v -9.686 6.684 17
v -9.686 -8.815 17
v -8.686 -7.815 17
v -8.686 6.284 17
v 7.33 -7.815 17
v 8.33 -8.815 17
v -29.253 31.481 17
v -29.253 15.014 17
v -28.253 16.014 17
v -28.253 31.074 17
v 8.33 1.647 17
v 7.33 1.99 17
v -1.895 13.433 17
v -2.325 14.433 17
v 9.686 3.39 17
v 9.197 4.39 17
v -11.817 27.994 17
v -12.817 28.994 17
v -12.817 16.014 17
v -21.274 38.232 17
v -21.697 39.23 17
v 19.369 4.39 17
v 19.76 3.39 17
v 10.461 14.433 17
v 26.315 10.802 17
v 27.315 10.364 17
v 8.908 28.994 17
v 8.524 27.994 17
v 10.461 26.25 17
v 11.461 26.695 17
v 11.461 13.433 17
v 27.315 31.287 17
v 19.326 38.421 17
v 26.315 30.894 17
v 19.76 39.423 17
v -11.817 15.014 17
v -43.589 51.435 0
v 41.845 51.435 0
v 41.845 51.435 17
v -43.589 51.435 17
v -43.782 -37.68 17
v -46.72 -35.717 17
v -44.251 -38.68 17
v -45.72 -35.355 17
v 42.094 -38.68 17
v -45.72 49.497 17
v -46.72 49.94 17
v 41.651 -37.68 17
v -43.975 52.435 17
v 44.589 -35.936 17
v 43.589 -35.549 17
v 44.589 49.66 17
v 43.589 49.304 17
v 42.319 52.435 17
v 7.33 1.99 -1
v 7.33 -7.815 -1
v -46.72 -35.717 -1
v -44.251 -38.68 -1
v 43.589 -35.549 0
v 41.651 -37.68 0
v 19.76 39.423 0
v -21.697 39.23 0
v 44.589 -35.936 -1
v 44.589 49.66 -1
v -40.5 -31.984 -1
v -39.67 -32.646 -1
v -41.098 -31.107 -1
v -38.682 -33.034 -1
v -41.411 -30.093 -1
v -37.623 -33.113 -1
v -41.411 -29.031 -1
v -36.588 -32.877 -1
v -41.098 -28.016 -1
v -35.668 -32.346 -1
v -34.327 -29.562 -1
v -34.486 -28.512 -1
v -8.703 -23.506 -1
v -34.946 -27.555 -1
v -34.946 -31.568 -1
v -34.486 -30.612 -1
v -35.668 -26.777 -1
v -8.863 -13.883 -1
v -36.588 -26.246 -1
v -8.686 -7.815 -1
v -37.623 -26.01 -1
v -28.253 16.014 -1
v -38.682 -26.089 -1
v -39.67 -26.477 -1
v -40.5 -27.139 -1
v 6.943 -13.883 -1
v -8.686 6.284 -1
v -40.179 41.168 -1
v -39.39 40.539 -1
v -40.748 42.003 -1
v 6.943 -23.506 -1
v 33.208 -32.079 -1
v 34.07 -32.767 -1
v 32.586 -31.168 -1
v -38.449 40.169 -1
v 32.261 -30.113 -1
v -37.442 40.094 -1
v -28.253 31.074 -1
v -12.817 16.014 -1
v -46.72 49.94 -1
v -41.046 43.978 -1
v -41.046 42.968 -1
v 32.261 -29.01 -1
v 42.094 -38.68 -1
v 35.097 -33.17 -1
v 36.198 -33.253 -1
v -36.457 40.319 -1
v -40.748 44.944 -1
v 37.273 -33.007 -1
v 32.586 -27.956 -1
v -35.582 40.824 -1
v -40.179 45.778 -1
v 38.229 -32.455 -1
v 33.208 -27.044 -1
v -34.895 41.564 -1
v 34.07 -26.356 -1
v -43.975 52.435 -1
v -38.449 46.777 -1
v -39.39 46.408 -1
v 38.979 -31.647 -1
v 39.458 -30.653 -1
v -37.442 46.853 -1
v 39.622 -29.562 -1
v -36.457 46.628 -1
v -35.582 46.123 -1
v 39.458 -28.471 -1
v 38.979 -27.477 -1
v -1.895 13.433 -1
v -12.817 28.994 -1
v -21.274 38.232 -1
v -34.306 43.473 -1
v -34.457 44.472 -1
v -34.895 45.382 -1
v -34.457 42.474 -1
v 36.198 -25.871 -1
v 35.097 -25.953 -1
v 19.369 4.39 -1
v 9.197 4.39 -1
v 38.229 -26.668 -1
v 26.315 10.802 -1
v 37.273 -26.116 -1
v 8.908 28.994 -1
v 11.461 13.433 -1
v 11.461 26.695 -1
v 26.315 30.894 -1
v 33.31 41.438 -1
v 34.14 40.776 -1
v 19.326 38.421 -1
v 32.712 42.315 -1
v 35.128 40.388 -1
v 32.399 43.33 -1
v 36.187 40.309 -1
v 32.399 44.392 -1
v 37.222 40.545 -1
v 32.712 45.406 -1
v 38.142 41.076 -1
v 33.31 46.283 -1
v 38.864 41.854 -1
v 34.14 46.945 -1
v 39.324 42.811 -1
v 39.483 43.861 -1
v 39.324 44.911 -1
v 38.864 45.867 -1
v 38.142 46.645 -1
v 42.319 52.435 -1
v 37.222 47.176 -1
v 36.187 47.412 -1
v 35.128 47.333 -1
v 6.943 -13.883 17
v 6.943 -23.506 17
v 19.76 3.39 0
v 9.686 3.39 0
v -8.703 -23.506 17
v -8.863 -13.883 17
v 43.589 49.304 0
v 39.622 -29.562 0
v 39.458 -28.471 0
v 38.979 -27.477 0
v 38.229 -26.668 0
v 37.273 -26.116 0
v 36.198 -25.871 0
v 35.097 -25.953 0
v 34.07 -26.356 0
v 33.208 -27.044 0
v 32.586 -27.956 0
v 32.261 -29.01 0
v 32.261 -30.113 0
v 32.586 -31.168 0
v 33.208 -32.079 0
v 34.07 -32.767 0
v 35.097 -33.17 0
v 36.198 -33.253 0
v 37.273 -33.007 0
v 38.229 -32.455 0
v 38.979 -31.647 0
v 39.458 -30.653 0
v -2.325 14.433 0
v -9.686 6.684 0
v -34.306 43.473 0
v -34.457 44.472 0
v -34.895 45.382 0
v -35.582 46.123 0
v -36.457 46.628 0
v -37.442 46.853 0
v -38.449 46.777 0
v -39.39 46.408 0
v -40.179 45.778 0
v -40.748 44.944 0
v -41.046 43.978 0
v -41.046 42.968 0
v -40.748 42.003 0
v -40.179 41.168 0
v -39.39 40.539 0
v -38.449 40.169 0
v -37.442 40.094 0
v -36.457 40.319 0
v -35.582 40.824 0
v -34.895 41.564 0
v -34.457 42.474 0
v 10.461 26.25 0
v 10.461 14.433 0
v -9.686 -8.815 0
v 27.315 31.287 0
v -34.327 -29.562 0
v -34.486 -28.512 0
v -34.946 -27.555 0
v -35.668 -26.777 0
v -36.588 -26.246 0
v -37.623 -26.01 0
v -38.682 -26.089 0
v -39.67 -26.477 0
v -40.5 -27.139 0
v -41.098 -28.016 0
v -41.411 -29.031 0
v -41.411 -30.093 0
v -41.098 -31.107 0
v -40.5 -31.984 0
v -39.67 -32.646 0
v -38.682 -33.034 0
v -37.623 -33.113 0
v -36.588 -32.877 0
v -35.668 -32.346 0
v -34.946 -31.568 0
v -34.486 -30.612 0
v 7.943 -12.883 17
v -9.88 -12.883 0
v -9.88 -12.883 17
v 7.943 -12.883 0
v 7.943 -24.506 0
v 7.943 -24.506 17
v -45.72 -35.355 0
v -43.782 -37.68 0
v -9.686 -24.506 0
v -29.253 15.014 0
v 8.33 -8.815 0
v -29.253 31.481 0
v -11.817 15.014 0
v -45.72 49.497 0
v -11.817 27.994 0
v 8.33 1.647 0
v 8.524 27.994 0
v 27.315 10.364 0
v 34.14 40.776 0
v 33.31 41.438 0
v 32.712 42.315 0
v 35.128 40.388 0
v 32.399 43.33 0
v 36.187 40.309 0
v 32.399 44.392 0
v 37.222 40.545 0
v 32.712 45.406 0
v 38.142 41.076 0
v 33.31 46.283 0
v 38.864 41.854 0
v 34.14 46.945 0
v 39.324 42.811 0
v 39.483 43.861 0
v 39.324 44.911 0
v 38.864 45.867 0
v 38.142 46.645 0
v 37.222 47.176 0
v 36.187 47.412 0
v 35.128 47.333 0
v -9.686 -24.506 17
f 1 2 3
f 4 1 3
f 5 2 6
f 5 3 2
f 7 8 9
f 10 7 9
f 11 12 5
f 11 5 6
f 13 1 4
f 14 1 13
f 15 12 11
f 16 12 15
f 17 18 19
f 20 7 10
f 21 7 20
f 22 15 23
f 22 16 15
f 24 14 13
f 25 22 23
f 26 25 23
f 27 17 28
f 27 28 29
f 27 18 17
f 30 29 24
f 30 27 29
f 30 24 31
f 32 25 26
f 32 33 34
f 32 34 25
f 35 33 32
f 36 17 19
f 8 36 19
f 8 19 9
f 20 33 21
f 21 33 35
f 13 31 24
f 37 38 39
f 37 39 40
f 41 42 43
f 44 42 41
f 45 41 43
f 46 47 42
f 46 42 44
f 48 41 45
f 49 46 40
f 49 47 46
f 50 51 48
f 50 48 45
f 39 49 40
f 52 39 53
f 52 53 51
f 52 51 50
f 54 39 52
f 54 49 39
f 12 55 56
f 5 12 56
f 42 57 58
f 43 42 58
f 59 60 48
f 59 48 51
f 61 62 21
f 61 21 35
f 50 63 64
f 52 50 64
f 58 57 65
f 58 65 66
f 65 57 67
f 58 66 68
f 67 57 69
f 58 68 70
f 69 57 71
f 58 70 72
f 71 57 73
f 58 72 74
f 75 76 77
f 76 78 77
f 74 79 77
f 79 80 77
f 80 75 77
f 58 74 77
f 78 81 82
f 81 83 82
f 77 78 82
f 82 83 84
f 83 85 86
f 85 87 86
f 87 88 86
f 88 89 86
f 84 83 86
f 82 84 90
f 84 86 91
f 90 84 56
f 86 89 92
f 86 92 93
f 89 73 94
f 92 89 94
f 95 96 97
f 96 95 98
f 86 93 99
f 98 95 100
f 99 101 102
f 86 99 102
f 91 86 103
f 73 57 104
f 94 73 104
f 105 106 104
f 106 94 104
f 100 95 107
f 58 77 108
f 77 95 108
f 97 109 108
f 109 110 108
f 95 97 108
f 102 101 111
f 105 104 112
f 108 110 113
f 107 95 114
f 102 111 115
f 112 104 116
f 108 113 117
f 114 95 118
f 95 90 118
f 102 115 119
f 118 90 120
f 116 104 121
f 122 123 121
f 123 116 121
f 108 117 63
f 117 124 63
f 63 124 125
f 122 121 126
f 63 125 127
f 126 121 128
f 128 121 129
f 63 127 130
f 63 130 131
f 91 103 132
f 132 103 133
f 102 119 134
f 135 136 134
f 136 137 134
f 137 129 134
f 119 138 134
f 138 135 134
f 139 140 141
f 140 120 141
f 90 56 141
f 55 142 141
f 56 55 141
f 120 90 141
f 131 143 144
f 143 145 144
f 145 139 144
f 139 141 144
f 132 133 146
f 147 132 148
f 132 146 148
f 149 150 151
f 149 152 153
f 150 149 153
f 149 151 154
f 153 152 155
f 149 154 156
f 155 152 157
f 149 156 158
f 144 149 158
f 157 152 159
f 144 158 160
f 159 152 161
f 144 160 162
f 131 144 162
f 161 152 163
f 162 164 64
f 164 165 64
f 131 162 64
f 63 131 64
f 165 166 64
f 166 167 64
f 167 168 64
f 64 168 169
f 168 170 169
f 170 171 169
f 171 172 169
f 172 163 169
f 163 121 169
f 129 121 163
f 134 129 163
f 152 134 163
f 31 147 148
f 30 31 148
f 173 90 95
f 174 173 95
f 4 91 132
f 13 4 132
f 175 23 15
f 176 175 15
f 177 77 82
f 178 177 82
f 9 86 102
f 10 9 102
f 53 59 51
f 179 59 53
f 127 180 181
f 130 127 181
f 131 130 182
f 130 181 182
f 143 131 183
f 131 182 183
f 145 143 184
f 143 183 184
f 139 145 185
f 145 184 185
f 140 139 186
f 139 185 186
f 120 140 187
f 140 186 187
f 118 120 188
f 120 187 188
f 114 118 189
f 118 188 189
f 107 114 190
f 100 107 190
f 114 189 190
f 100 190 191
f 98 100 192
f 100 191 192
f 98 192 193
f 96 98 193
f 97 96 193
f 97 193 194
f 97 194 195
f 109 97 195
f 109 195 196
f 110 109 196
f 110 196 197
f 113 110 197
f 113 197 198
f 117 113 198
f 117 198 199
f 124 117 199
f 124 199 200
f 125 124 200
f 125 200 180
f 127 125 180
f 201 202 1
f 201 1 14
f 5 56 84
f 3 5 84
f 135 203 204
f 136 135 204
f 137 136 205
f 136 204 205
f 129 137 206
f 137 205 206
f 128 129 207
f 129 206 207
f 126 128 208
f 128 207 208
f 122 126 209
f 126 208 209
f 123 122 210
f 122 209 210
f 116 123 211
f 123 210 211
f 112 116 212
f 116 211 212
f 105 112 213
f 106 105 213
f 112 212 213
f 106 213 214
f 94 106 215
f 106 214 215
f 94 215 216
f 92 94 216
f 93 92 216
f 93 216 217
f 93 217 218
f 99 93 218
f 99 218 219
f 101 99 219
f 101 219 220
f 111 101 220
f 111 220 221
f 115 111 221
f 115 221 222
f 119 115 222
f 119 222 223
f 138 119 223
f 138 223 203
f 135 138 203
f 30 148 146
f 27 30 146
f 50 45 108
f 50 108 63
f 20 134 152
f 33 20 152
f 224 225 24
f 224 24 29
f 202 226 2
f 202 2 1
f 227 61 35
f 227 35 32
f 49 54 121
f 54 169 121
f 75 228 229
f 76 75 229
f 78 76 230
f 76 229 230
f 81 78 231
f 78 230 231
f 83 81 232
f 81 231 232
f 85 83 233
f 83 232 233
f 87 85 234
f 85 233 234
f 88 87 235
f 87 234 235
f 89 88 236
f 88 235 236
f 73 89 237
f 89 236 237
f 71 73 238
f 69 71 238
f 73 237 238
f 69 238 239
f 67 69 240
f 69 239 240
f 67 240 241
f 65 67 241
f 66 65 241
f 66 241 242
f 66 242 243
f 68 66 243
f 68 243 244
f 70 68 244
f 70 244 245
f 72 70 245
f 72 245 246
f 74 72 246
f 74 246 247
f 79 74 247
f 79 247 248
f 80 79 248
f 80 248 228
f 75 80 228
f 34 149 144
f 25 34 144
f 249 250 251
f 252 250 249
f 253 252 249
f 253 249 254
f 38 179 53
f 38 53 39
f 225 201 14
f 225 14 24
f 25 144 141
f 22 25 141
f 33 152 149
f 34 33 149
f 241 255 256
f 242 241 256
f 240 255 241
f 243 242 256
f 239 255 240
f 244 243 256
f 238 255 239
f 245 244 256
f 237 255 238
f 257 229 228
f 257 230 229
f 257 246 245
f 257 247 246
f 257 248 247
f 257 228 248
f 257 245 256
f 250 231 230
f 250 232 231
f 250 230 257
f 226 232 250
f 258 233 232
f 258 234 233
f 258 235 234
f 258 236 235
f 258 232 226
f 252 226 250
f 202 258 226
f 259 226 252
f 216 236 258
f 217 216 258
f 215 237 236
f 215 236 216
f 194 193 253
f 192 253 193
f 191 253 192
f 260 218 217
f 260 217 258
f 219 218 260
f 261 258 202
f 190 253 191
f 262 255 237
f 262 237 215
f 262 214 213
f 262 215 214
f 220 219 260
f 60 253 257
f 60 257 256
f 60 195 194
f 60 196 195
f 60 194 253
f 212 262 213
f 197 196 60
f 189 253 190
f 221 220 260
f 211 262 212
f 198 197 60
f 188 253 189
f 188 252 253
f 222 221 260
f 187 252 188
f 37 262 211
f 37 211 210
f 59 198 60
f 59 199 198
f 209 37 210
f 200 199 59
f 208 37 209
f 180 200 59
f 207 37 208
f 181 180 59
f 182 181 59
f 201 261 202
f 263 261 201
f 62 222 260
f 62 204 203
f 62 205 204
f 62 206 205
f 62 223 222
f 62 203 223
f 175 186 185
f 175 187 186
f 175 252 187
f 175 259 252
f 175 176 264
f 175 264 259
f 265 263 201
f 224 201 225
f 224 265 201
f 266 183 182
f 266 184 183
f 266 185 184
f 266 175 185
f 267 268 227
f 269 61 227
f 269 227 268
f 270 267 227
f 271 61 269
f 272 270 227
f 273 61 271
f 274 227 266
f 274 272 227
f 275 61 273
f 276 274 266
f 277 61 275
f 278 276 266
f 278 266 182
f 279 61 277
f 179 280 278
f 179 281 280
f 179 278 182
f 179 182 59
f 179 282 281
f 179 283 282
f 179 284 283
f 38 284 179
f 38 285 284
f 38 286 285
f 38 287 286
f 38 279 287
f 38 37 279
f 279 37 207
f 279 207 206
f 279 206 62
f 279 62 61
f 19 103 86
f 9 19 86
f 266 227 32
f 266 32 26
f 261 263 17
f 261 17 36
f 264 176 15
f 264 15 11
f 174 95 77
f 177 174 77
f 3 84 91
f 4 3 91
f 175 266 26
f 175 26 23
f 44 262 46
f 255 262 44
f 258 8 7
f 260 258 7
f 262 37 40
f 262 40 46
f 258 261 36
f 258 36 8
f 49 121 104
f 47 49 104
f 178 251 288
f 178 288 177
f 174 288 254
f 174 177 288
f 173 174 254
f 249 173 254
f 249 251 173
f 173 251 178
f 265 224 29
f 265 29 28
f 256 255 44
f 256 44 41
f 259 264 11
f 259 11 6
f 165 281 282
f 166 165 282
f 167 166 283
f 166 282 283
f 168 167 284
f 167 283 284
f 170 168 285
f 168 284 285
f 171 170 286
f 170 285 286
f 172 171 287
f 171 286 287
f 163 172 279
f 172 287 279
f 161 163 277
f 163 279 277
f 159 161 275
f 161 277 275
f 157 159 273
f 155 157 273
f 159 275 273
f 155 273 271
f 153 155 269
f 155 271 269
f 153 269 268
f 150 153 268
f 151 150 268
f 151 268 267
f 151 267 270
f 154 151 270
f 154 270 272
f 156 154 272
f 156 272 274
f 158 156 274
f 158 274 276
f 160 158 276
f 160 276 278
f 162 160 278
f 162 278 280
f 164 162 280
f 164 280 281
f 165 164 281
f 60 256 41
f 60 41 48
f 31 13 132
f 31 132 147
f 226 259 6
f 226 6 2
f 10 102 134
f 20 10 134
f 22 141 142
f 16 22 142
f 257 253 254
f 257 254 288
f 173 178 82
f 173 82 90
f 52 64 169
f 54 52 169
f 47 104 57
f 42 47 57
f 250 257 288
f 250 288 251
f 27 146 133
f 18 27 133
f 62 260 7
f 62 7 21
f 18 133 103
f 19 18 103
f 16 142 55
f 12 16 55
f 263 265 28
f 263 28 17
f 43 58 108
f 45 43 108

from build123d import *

# Parameters (mm, degrees)
F1_DEPTH = 17
F2_T     = 1
F3_R     = 3.5616299701
F3_R_2   = 3.3888359299
F3_R_3   = 3.7011523773
F3_R_4   = 3.561628653
F4_DEPTH = 25


with BuildPart() as f1:
    # F0 (on Top) → F1 (new body)
    with BuildSketch(Plane.XY):
        Polygon((-43.5885637999, 51.4345057309), (-45.7195602357, 49.4972355664), (-45.7195602357, -35.3551693261), (-43.7822900712, -37.6798920333), (41.6512936354, -37.6798920333), (43.5885637999, -35.5488955975), (43.5885637999, 49.303509295), (41.8450199068, 51.4345057309), align=None)
        Polygon((-9.6863470972, -24.5064590126), (-9.8800742999, -12.882841751), (7.9428050667, -12.882841751), (7.9428050667, -24.5064590126), align=None, mode=Mode.SUBTRACT)
        Polygon((-29.2527694255, 31.4806289971), (-21.6974187642, 39.2297059298), (19.7601504624, 39.4234322011), (27.315499261, 31.2869027257), (27.315499261, 10.364391841), (19.7601504624, 3.3902216237), (9.6863470972, 3.3902216237), (8.3302585408, 1.6466790112), (8.3302585408, -8.8145760819), (-9.6863470972, -8.8145760819), (-9.6863470972, 6.6835791804), (-2.3247229401, 14.4326565787), (10.4612540454, 14.4326565787), (10.4612540454, 26.2500010431), (8.5239848122, 27.9935430735), (-11.817343533, 27.9935430735), (-11.817343533, 26.4437273145), (-11.817343533, 15.0138381869), (-29.2527694255, 15.0138381869), align=None, mode=Mode.SUBTRACT)
    extrude(amount=F1_DEPTH)

    # F2
    f2_openings = [f1.faces().sort_by_distance(p)[0] for p in [
        (-0.871772, 50.172867, 17),
    ]]
    offset(amount=F2_T, openings=f2_openings, kind=Kind.INTERSECTION)

    # F3 (on Top) → F4 (cut)
    with BuildSketch(Plane.XY):
        with Locations((35.9209813178, 43.8607819378)):
            Circle(F3_R)
        with Locations((-37.6952588558, 43.4733256698)):
            Circle(F3_R_2)
        with Locations((35.9209813178, -29.5617301017)):
            Circle(F3_R_3)
        with Locations((-37.8889851272, -29.5617301017)):
            Circle(F3_R_4)
    extrude(amount=-F4_DEPTH, mode=Mode.SUBTRACT)


solid = f1.part
